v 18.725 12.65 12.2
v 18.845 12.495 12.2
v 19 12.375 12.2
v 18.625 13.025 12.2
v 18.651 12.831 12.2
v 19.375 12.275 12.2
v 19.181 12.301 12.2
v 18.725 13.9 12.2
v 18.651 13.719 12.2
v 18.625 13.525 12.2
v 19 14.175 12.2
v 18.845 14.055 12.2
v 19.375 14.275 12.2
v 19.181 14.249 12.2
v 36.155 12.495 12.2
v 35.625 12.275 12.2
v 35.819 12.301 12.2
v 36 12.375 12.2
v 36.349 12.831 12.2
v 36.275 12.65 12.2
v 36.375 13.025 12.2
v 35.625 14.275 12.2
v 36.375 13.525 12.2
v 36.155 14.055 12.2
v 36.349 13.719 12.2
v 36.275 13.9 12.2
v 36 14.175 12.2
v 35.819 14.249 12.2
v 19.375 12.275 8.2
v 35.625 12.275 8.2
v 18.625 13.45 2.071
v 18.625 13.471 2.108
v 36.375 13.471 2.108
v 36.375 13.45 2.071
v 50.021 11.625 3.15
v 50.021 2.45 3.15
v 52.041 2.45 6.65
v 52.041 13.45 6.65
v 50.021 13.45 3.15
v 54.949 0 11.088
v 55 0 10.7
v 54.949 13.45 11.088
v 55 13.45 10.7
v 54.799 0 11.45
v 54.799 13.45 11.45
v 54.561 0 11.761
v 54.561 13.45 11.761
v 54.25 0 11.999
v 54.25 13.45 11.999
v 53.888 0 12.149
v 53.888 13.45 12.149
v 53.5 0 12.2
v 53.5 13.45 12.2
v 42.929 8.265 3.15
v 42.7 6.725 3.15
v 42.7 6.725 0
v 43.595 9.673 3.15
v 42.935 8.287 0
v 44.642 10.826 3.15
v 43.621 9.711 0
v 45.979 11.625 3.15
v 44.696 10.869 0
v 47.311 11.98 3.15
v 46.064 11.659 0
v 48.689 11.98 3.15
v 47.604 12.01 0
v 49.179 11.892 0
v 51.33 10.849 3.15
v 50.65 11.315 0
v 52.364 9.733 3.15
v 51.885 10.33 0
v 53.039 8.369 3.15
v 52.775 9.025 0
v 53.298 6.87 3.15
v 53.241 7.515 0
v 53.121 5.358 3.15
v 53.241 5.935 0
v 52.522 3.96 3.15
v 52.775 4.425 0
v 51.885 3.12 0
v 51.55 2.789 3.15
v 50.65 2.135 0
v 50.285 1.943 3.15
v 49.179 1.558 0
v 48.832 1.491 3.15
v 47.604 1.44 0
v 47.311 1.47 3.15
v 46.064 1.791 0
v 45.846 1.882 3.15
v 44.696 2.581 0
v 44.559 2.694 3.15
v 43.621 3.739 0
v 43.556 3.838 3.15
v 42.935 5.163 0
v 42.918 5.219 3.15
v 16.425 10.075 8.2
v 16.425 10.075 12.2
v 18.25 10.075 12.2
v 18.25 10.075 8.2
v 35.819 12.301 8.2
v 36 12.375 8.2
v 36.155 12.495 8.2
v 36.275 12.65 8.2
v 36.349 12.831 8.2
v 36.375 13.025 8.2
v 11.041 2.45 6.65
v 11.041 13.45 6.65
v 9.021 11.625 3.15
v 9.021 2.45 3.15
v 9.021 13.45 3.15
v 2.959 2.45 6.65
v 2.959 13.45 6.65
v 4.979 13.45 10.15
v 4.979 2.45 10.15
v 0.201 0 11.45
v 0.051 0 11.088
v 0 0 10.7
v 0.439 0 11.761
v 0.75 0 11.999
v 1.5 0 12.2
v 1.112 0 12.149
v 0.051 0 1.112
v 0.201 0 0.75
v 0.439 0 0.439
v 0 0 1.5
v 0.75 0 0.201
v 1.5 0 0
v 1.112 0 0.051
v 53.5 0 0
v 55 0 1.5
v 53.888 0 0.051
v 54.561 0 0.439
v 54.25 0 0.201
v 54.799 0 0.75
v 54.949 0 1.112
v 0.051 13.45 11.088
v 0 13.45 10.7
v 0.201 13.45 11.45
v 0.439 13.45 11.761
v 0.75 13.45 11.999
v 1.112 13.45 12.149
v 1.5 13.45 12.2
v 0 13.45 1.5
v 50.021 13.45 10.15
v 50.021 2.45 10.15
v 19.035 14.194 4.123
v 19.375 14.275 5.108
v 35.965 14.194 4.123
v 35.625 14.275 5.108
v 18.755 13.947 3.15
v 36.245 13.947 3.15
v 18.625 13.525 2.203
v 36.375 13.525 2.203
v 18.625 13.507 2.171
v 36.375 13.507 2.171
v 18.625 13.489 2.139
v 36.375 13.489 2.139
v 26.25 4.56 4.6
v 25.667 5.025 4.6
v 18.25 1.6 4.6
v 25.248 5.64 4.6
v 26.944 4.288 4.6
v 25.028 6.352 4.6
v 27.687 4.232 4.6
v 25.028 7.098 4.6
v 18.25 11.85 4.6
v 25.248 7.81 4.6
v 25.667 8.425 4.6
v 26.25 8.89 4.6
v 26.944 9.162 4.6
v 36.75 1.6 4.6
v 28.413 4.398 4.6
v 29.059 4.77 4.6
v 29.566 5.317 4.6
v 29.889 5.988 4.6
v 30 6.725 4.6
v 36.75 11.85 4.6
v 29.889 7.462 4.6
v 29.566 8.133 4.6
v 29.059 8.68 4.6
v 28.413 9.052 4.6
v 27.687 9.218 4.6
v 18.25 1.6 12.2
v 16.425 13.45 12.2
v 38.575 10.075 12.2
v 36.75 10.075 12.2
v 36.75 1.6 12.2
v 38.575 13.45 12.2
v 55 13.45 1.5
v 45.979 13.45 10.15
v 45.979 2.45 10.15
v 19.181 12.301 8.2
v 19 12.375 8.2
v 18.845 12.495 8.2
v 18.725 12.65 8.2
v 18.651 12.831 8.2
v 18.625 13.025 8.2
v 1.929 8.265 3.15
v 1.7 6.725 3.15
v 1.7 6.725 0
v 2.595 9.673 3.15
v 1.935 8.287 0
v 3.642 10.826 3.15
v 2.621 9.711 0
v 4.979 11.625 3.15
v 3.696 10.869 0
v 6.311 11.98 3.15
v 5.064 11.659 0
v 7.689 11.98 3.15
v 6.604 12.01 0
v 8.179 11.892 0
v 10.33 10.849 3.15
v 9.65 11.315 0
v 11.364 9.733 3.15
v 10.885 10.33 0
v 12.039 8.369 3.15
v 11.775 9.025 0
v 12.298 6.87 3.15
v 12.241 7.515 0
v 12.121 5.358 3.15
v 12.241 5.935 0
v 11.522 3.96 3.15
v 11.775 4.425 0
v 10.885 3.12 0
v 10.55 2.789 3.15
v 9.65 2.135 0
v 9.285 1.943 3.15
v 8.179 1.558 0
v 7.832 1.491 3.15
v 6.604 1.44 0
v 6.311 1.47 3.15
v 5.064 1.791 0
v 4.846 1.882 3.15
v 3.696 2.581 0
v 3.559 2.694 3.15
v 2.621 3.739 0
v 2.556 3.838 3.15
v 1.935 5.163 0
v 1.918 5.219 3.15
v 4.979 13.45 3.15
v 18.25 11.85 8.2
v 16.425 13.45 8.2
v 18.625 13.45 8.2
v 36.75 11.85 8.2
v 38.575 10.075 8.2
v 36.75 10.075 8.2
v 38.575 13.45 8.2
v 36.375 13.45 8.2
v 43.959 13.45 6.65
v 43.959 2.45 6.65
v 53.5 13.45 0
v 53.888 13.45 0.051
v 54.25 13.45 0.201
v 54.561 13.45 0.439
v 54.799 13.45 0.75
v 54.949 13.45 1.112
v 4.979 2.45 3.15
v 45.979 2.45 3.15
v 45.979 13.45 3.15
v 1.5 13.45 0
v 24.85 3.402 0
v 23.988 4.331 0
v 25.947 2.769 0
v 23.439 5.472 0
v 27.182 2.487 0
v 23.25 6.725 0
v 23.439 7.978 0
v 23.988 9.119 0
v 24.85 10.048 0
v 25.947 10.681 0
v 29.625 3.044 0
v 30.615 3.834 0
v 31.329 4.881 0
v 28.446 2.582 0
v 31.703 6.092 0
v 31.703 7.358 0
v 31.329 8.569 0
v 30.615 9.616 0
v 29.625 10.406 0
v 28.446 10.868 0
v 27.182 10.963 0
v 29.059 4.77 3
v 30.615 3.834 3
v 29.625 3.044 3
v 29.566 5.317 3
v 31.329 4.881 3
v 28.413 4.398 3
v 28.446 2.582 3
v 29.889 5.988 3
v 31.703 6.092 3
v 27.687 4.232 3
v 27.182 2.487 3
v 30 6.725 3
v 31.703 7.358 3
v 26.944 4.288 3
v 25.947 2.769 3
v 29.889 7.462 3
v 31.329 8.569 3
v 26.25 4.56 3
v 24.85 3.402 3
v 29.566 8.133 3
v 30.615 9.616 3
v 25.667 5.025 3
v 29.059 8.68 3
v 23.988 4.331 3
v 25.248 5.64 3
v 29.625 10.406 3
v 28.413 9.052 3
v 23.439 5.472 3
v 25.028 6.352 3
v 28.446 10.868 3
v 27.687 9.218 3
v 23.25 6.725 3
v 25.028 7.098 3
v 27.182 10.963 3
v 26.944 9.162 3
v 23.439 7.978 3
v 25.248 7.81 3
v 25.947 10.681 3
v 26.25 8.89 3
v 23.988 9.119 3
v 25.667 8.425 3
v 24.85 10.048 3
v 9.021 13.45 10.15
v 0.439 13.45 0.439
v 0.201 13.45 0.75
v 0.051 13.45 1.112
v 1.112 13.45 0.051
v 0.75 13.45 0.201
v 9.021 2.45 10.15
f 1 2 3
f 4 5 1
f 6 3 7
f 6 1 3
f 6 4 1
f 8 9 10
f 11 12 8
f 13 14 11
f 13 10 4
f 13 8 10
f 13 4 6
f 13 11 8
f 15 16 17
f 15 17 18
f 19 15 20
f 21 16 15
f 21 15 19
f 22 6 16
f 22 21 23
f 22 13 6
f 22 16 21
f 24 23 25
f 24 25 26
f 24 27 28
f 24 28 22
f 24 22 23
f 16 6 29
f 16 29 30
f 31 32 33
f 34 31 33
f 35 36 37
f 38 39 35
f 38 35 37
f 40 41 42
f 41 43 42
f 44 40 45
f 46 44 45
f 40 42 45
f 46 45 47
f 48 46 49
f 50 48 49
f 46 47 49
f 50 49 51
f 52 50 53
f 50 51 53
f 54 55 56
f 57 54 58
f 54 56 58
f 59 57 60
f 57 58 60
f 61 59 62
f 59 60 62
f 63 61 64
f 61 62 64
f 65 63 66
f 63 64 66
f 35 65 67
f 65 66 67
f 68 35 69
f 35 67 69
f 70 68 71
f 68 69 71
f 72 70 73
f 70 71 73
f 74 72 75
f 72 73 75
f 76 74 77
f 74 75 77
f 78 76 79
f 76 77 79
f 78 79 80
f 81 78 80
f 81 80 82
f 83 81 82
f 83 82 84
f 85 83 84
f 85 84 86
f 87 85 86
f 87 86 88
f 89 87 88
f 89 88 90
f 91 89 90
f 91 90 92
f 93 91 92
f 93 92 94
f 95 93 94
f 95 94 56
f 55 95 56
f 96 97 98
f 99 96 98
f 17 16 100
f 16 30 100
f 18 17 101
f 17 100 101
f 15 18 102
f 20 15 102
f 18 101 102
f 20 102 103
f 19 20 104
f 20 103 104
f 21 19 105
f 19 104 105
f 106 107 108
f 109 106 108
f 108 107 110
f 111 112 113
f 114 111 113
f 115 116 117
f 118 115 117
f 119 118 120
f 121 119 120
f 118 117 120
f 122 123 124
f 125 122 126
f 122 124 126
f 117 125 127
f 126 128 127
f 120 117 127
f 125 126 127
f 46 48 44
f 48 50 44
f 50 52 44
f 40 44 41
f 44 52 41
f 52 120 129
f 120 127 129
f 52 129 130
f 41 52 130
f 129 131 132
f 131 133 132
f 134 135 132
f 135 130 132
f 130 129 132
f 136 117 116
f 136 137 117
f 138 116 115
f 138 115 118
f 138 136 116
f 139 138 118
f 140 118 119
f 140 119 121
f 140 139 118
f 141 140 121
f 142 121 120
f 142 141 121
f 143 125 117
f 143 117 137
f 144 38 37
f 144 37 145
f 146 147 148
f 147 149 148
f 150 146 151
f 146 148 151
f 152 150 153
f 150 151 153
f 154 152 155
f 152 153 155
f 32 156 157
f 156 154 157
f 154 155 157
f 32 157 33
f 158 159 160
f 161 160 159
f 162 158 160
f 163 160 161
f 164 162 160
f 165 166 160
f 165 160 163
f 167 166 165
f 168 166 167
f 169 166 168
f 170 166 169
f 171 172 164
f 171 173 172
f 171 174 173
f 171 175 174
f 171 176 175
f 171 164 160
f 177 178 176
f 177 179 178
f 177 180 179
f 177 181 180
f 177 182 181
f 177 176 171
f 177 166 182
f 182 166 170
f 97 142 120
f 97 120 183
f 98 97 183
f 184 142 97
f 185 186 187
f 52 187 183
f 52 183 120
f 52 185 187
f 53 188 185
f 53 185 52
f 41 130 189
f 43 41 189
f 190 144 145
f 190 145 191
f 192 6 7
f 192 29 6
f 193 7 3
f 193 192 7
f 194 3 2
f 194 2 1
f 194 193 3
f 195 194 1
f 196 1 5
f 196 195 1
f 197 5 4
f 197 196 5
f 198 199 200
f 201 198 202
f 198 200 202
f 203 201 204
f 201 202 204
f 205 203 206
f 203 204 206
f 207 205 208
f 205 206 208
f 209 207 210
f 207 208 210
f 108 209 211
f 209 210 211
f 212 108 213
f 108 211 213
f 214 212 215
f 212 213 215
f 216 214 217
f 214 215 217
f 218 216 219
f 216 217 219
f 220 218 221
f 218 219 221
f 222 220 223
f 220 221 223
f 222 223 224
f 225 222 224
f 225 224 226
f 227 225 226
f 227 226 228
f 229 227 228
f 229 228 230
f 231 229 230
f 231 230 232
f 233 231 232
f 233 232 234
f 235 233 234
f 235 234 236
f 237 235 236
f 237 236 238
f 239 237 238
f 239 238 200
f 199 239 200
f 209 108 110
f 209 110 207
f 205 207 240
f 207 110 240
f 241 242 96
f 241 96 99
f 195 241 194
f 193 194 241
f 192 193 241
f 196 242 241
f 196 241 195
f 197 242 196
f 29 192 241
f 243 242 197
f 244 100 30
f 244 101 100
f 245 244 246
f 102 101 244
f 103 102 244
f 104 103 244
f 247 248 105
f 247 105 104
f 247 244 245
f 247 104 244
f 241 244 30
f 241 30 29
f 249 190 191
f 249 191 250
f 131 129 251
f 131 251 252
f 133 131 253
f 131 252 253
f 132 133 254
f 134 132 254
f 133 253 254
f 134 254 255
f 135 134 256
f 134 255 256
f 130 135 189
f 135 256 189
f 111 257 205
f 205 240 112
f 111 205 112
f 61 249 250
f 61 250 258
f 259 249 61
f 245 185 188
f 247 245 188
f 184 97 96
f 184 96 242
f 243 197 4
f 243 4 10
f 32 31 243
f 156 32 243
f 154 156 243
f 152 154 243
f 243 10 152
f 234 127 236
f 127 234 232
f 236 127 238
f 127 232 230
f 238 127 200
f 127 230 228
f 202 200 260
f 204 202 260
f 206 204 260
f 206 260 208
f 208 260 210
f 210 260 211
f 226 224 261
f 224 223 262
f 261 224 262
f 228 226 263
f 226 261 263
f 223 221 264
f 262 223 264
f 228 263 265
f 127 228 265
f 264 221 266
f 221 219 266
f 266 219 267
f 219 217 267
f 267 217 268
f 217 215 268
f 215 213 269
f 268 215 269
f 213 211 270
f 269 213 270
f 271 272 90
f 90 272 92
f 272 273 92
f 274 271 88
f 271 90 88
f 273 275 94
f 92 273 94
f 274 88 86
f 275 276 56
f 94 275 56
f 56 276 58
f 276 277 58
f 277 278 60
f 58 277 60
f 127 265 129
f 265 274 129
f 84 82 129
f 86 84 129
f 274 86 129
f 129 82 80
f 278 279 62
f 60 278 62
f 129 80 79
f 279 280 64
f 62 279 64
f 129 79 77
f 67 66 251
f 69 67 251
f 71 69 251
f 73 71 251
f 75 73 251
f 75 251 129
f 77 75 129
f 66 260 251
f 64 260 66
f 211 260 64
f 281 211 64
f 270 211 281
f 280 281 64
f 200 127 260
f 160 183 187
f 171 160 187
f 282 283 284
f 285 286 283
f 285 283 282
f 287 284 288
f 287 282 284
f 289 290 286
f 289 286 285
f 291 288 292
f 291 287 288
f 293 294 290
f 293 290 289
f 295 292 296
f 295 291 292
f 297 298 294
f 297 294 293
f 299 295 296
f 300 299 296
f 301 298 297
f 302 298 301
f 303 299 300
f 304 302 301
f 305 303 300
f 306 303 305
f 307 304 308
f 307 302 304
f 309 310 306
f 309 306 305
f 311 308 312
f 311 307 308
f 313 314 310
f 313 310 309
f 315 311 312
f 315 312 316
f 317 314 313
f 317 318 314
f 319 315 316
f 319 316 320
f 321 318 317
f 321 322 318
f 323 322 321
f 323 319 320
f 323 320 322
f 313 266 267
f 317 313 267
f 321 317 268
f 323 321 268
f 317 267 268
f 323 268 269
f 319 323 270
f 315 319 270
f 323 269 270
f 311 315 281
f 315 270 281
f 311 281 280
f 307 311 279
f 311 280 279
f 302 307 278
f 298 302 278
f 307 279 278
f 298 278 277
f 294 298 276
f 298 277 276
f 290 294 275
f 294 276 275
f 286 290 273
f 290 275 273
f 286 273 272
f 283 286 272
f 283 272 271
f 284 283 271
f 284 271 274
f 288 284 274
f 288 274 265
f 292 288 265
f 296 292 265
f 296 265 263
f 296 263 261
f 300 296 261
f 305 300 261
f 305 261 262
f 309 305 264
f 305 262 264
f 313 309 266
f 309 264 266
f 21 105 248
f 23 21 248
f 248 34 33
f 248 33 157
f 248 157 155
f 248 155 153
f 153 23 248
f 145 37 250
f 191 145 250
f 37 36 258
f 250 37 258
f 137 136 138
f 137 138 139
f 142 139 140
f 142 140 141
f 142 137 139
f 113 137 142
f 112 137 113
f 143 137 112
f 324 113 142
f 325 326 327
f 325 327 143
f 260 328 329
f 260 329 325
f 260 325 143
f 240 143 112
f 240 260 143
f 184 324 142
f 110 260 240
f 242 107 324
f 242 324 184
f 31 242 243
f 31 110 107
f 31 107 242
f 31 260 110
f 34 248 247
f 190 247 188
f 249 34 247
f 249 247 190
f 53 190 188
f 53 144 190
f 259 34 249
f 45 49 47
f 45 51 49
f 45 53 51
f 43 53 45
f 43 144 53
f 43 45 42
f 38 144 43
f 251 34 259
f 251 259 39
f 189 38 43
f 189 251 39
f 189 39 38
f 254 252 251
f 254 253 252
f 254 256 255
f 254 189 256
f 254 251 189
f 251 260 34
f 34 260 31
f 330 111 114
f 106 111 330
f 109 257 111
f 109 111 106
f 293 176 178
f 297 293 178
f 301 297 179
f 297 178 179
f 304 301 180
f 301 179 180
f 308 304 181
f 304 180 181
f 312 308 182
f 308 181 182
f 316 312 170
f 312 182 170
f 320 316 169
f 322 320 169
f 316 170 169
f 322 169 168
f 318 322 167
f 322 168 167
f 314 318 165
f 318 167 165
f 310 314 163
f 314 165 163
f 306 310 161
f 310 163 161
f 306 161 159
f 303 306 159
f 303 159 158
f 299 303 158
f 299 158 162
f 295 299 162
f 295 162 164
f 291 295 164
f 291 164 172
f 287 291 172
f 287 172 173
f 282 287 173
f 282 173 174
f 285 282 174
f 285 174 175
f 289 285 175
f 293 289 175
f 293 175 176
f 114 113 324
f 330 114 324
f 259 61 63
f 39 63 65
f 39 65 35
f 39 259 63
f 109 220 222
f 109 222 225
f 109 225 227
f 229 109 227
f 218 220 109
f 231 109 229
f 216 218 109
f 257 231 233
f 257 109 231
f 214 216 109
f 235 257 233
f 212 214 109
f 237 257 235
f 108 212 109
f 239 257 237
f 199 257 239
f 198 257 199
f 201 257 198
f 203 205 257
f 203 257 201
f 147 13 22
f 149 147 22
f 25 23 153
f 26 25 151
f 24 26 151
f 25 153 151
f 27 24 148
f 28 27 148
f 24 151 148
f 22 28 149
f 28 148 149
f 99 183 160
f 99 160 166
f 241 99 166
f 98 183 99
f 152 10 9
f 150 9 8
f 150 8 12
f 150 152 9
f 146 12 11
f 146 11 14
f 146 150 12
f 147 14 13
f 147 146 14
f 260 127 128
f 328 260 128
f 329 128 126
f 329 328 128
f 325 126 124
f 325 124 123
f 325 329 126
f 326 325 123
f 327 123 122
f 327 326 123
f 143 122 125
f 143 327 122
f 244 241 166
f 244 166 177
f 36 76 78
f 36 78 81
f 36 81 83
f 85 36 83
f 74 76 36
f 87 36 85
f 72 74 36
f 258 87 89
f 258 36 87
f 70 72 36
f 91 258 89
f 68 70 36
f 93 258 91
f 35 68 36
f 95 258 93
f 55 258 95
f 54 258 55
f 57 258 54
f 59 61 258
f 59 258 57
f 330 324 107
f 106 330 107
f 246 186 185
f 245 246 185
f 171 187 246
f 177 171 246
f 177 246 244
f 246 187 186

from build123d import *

# Parameters (mm, degrees)
SKETCH2_W           = 55
SKETCH2_H           = 13.45
BOSS_EXTRUDE1_DEPTH = 12.2
SKETCH3_W           = 18.5
SKETCH3_H           = 10.25
CUT_EXTRUDE1_DEPTH  = 7.6
SKETCH5_W           = 22.15
SKETCH5_H           = 1.6
CUT_EXTRUDE2_DEPTH  = 4
SKETCH6_W           = 17.75
SKETCH6_H           = 2
BOSS_EXTRUDE2_DEPTH = 8.7
SKETCH7_W           = 1.825
SKETCH7_H           = 3.375
CUT_EXTRUDE3_DEPTH  = 4
FILLET1_R           = 0.75
FILLET3_R           = 0.75
DRAFT4_ANGLE        = 60
FILLET5_R           = 6
SKETCH8_R           = 2.5
CUT_EXTRUDE4_DEPTH  = 58.328314378
SKETCH9_R           = 4.25
CUT_EXTRUDE5_DEPTH  = 3
SKETCH10_R          = 5.3
CUT_EXTRUDE6_DEPTH  = 3.15
CUT_EXTRUDE7_DEPTH  = 11
FILLET6_R           = 1.5


with BuildPart() as part:
    # Sketch2 → Boss-Extrude1 (new body)
    with BuildSketch(Plane.XY):
        with Locations((27.5, 6.725)):
            Rectangle(SKETCH2_W, SKETCH2_H)
    extrude(amount=BOSS_EXTRUDE1_DEPTH)

    # Sketch3 → Cut-Extrude1 (cut)
    with BuildSketch(Plane.XY.offset(12.2)):
        with Locations((27.5, 6.725)):
            Rectangle(SKETCH3_W, SKETCH3_H)
    extrude(amount=-CUT_EXTRUDE1_DEPTH, mode=Mode.SUBTRACT)

    # Sketch5 → Cut-Extrude2 (cut)
    with BuildSketch(Plane.XY.offset(12.2)):
        with Locations((27.5, 12.65)):
            Rectangle(SKETCH5_W, SKETCH5_H)
    extrude(amount=-CUT_EXTRUDE2_DEPTH, mode=Mode.SUBTRACT)

    # Sketch6 → Boss-Extrude2 (add)
    with BuildSketch(Plane.XY.offset(12.2)):
        with Locations((27.5, 13.275)):
            Rectangle(SKETCH6_W, SKETCH6_H)
    extrude(amount=-BOSS_EXTRUDE2_DEPTH)

    # Sketch7 → Cut-Extrude3 (cut)
    with BuildSketch(Plane.XY.offset(12.2)):
        with Locations((37.6625, 11.7625)):
            Rectangle(SKETCH7_W, SKETCH7_H)
        with Locations((17.3375, 11.7625)):
            Rectangle(SKETCH7_W, SKETCH7_H)
    extrude(amount=-CUT_EXTRUDE3_DEPTH, mode=Mode.SUBTRACT)

    # Fillet1
    fillet1_edges = [part.edges().sort_by_distance(p)[0] for p in [
        (36.375, 14.275, 7.85),
        (36.375, 12.275, 10.2),
    ]]
    fillet(fillet1_edges, radius=FILLET1_R)

    # Fillet3
    fillet3_edges = [part.edges().sort_by_distance(p)[0] for p in [
        (18.625, 12.275, 10.2),
        (18.625, 14.275, 7.85),
    ]]
    fillet(fillet3_edges, radius=FILLET3_R)

    # Draft4
    draft4_faces = [part.faces().sort_by_distance(p)[0] for p in [
        (27.5, 13.858393484, 3.5),
    ]]
    draft(draft4_faces, Plane(origin=(18.625, 14.275, 3.5), x_dir=(0, 0, 1), z_dir=(0, 1, 0)), DRAFT4_ANGLE)

    # Fillet5
    # the kernel refuses this fillet: 6 mm, written as the material it takes off along each edge
    with BuildSketch(Plane(origin=(39.644237886, 14.275, 3.5), x_dir=(0, -0.49999999999999806, -0.8660254037844397), z_dir=(-1, 0, 0))) as fillet5_piece_1:
        with BuildLine():
            CenterArc((FILLET5_R * 0.267949192431, FILLET5_R), FILLET5_R, 240, 30)
            Line((-FILLET5_R * 0.232050807569, FILLET5_R * 0.133974596216), (0, 0))
            Line((0, 0), (FILLET5_R * 0.267949192431, 0))
        make_face()
    extrude(amount=24.288475773, mode=Mode.SUBTRACT)

    # Sketch8 → Cut-Extrude4 (cut, through all)
    with BuildSketch(Plane.XY.offset(4.6)):
        with Locations((27.5, 6.725)):
            Circle(SKETCH8_R)
    extrude(amount=-CUT_EXTRUDE4_DEPTH, mode=Mode.SUBTRACT)

    # Sketch9 → Cut-Extrude5 (cut)
    with BuildSketch(Plane(origin=(0, 0, 0), x_dir=(-1, 0, 0), z_dir=(0, 0, -1))):
        with Locations((-27.5, 6.725)):
            Circle(SKETCH9_R)
    extrude(amount=-CUT_EXTRUDE5_DEPTH, mode=Mode.SUBTRACT)

    # Sketch10 → Cut-Extrude6 (cut)
    with BuildSketch(Plane(origin=(0, 0, 0), x_dir=(-1, 0, 0), z_dir=(0, 0, -1))):
        with Locations((-48, 6.725)):
            Circle(SKETCH10_R)
        with Locations((-7, 6.725)):
            Circle(SKETCH10_R)
    extrude(amount=-CUT_EXTRUDE6_DEPTH, mode=Mode.SUBTRACT)

    # Sketch11 → Cut-Extrude7 (cut)
    with BuildSketch(Plane(origin=(0, 13.45, 0), x_dir=(1, 0, 0), z_dir=(0, 1, 0))):
        Polygon((9.020725942, -3.15), (4.979274058, -3.15), (2.958548116, -6.65), (4.979274058, -10.15), (9.020725942, -10.15), (11.041451884, -6.65), align=None)
        Polygon((43.958548116, -6.65), (45.979274058, -3.15), (50.020725942, -3.15), (52.041451884, -6.65), (50.020725942, -10.15), (45.979274058, -10.15), align=None)
    extrude(amount=-CUT_EXTRUDE7_DEPTH, mode=Mode.SUBTRACT)

    # Fillet6
    fillet6_edges = [part.edges().sort_by_distance(p)[0] for p in [
        (55, 6.725, 12.2),
        (0, 6.725, 12.2),
        (55, 6.725, 0),
        (0, 6.725, 0),
    ]]
    fillet(fillet6_edges, radius=FILLET6_R)


solid = part.part
